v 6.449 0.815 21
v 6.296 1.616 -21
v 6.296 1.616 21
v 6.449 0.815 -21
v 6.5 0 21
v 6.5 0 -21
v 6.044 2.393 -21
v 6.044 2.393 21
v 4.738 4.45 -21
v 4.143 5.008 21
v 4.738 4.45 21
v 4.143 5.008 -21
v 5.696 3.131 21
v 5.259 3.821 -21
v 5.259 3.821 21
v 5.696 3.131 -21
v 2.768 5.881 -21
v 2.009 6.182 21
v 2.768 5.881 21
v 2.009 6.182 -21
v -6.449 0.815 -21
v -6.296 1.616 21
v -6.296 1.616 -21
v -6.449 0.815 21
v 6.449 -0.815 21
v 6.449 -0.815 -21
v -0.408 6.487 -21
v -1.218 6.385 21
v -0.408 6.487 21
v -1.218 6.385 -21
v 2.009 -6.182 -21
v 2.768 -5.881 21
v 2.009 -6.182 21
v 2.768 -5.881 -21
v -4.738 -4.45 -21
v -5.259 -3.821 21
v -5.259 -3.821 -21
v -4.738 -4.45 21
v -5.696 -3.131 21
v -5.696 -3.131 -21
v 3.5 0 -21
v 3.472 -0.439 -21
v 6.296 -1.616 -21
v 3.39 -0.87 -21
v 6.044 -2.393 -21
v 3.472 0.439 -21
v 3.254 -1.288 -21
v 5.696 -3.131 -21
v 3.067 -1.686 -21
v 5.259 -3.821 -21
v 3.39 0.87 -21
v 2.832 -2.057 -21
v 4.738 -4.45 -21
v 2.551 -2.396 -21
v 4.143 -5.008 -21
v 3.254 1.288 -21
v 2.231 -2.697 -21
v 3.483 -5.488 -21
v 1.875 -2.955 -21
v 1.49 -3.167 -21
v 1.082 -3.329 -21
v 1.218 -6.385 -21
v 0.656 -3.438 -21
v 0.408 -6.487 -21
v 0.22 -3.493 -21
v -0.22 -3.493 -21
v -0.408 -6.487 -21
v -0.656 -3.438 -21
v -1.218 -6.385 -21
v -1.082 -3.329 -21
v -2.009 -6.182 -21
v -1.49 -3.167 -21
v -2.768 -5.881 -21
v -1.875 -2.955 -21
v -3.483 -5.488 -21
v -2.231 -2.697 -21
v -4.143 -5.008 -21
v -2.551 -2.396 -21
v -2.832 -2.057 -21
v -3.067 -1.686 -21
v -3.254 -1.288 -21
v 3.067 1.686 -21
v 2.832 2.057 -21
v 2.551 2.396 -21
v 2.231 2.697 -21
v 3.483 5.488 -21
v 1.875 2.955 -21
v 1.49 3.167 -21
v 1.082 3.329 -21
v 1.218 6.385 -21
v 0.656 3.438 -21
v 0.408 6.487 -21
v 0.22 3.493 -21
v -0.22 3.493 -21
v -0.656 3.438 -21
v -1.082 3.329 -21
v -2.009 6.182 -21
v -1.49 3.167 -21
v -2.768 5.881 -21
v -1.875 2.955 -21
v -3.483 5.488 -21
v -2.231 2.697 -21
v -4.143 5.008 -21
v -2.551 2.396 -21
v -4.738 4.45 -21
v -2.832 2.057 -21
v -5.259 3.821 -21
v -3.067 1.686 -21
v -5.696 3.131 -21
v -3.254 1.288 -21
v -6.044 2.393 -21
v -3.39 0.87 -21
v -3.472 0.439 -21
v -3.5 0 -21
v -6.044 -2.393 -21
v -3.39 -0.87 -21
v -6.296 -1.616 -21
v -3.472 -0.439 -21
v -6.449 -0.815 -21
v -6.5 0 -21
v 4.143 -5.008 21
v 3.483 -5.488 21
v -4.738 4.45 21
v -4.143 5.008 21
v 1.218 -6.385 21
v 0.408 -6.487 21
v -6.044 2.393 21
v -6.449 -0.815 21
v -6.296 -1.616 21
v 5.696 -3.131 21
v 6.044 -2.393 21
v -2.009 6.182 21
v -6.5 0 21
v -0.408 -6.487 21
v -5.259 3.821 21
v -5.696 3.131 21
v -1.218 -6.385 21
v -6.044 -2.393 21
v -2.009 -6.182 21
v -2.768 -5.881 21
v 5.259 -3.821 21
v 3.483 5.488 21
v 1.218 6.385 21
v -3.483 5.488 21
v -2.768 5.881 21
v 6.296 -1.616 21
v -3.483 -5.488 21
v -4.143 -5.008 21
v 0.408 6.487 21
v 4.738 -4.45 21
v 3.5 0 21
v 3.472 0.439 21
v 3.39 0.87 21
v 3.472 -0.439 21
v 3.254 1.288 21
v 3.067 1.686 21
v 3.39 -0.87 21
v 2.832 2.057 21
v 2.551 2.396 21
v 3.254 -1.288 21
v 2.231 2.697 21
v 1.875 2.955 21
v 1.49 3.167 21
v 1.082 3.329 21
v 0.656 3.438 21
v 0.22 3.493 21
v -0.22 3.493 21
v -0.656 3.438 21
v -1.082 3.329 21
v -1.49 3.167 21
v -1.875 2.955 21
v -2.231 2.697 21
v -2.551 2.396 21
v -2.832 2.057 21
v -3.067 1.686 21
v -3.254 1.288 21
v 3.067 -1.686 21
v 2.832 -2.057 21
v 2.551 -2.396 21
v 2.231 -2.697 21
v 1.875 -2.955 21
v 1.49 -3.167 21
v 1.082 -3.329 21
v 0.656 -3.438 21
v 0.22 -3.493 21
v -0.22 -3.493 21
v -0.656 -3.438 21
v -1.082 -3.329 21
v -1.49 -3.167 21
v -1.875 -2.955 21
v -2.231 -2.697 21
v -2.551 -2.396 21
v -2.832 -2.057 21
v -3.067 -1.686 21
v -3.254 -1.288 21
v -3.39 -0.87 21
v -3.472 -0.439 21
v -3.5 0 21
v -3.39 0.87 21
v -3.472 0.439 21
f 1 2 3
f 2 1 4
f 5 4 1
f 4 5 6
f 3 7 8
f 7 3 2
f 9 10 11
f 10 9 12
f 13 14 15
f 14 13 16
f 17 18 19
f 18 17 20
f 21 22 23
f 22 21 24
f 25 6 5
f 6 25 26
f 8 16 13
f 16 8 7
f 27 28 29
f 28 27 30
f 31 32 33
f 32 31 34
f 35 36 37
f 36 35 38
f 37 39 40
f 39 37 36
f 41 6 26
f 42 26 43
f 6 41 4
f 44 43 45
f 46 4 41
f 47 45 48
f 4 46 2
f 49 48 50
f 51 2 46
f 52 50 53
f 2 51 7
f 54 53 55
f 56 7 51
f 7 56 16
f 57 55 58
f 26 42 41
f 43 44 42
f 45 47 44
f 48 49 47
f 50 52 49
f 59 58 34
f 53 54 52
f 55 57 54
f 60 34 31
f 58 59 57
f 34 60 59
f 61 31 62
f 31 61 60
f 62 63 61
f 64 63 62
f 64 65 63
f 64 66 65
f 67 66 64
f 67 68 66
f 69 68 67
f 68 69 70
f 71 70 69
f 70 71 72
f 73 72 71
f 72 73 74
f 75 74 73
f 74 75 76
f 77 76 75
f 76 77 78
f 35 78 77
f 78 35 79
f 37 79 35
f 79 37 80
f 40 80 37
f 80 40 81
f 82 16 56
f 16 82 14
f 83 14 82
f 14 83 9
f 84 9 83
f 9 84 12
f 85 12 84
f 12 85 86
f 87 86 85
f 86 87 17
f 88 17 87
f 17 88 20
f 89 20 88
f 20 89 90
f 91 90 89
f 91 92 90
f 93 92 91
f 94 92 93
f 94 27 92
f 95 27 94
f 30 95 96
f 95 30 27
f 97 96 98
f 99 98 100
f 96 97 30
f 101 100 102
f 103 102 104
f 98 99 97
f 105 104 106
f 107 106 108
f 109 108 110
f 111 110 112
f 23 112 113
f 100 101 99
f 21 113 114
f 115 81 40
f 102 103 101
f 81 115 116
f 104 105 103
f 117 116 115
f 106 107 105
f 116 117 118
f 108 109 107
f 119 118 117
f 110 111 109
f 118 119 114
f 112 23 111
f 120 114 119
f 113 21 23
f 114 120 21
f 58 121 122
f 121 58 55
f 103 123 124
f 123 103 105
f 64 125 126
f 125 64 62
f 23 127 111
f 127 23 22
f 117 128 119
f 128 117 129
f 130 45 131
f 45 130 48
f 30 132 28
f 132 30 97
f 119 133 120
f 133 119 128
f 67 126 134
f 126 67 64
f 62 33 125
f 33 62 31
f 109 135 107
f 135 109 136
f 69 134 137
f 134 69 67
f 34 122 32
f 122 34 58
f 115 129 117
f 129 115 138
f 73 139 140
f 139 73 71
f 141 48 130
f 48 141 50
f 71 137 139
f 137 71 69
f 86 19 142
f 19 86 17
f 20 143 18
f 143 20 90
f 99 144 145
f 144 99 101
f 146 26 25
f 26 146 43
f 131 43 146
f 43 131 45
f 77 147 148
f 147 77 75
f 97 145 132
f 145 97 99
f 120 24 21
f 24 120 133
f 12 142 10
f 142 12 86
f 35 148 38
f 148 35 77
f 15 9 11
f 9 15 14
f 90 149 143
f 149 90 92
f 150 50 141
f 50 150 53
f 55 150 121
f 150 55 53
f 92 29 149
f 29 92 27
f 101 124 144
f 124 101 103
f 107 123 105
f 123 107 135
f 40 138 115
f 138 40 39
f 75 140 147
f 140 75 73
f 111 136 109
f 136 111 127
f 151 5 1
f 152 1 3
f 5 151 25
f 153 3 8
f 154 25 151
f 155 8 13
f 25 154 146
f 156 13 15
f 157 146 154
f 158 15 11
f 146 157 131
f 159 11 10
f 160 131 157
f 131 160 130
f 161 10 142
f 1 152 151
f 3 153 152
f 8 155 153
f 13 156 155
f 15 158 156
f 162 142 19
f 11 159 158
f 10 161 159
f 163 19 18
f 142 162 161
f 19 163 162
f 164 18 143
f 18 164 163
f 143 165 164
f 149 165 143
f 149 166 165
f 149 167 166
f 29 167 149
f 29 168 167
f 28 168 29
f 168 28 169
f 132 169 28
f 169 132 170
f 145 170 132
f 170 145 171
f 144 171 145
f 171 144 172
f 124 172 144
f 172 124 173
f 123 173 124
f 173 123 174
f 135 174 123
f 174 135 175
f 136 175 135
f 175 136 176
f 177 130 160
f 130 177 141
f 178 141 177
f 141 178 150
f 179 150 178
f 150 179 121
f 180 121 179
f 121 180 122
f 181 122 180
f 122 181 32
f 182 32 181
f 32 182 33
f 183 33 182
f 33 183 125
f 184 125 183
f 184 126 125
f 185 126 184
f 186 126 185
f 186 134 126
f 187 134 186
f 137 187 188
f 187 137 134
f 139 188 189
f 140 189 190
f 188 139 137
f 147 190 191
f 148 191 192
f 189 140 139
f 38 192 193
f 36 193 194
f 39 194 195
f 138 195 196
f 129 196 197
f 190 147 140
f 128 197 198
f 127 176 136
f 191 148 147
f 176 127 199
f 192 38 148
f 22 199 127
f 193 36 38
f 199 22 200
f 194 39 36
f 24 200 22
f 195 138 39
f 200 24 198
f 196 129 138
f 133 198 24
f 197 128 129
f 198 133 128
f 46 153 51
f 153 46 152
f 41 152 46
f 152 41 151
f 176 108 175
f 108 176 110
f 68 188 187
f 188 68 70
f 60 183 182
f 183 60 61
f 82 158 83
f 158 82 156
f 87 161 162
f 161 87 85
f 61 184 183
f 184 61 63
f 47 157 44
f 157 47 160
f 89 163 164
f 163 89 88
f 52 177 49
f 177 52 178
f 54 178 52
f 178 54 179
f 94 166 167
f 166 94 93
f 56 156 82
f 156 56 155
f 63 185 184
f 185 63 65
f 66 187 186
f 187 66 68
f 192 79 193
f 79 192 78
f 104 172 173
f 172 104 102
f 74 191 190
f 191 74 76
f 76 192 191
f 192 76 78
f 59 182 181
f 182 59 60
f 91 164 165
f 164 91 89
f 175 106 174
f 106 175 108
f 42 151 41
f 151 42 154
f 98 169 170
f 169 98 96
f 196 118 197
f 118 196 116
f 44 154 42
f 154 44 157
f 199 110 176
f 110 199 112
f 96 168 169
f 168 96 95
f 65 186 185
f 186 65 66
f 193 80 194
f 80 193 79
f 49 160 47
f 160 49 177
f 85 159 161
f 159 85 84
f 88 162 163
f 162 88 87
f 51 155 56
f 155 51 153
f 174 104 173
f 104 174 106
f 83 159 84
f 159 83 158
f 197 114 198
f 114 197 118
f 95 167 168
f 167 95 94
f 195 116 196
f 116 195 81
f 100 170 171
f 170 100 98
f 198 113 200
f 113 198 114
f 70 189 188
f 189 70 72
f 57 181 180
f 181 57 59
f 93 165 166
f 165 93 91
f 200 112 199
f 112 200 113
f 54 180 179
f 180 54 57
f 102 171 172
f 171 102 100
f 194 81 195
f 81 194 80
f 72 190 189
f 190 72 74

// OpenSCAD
$fn = 50;


difference() {
	union() {
		translate(v = [0, 0, -21.0000000000]) {
			cylinder(h = 42, r = 6.5000000000);
		}
	}
	union() {
		translate(v = [0, 0, -100.0000000000]) {
			cylinder(h = 200, r = 3.5000000000);
		}
	}
}
